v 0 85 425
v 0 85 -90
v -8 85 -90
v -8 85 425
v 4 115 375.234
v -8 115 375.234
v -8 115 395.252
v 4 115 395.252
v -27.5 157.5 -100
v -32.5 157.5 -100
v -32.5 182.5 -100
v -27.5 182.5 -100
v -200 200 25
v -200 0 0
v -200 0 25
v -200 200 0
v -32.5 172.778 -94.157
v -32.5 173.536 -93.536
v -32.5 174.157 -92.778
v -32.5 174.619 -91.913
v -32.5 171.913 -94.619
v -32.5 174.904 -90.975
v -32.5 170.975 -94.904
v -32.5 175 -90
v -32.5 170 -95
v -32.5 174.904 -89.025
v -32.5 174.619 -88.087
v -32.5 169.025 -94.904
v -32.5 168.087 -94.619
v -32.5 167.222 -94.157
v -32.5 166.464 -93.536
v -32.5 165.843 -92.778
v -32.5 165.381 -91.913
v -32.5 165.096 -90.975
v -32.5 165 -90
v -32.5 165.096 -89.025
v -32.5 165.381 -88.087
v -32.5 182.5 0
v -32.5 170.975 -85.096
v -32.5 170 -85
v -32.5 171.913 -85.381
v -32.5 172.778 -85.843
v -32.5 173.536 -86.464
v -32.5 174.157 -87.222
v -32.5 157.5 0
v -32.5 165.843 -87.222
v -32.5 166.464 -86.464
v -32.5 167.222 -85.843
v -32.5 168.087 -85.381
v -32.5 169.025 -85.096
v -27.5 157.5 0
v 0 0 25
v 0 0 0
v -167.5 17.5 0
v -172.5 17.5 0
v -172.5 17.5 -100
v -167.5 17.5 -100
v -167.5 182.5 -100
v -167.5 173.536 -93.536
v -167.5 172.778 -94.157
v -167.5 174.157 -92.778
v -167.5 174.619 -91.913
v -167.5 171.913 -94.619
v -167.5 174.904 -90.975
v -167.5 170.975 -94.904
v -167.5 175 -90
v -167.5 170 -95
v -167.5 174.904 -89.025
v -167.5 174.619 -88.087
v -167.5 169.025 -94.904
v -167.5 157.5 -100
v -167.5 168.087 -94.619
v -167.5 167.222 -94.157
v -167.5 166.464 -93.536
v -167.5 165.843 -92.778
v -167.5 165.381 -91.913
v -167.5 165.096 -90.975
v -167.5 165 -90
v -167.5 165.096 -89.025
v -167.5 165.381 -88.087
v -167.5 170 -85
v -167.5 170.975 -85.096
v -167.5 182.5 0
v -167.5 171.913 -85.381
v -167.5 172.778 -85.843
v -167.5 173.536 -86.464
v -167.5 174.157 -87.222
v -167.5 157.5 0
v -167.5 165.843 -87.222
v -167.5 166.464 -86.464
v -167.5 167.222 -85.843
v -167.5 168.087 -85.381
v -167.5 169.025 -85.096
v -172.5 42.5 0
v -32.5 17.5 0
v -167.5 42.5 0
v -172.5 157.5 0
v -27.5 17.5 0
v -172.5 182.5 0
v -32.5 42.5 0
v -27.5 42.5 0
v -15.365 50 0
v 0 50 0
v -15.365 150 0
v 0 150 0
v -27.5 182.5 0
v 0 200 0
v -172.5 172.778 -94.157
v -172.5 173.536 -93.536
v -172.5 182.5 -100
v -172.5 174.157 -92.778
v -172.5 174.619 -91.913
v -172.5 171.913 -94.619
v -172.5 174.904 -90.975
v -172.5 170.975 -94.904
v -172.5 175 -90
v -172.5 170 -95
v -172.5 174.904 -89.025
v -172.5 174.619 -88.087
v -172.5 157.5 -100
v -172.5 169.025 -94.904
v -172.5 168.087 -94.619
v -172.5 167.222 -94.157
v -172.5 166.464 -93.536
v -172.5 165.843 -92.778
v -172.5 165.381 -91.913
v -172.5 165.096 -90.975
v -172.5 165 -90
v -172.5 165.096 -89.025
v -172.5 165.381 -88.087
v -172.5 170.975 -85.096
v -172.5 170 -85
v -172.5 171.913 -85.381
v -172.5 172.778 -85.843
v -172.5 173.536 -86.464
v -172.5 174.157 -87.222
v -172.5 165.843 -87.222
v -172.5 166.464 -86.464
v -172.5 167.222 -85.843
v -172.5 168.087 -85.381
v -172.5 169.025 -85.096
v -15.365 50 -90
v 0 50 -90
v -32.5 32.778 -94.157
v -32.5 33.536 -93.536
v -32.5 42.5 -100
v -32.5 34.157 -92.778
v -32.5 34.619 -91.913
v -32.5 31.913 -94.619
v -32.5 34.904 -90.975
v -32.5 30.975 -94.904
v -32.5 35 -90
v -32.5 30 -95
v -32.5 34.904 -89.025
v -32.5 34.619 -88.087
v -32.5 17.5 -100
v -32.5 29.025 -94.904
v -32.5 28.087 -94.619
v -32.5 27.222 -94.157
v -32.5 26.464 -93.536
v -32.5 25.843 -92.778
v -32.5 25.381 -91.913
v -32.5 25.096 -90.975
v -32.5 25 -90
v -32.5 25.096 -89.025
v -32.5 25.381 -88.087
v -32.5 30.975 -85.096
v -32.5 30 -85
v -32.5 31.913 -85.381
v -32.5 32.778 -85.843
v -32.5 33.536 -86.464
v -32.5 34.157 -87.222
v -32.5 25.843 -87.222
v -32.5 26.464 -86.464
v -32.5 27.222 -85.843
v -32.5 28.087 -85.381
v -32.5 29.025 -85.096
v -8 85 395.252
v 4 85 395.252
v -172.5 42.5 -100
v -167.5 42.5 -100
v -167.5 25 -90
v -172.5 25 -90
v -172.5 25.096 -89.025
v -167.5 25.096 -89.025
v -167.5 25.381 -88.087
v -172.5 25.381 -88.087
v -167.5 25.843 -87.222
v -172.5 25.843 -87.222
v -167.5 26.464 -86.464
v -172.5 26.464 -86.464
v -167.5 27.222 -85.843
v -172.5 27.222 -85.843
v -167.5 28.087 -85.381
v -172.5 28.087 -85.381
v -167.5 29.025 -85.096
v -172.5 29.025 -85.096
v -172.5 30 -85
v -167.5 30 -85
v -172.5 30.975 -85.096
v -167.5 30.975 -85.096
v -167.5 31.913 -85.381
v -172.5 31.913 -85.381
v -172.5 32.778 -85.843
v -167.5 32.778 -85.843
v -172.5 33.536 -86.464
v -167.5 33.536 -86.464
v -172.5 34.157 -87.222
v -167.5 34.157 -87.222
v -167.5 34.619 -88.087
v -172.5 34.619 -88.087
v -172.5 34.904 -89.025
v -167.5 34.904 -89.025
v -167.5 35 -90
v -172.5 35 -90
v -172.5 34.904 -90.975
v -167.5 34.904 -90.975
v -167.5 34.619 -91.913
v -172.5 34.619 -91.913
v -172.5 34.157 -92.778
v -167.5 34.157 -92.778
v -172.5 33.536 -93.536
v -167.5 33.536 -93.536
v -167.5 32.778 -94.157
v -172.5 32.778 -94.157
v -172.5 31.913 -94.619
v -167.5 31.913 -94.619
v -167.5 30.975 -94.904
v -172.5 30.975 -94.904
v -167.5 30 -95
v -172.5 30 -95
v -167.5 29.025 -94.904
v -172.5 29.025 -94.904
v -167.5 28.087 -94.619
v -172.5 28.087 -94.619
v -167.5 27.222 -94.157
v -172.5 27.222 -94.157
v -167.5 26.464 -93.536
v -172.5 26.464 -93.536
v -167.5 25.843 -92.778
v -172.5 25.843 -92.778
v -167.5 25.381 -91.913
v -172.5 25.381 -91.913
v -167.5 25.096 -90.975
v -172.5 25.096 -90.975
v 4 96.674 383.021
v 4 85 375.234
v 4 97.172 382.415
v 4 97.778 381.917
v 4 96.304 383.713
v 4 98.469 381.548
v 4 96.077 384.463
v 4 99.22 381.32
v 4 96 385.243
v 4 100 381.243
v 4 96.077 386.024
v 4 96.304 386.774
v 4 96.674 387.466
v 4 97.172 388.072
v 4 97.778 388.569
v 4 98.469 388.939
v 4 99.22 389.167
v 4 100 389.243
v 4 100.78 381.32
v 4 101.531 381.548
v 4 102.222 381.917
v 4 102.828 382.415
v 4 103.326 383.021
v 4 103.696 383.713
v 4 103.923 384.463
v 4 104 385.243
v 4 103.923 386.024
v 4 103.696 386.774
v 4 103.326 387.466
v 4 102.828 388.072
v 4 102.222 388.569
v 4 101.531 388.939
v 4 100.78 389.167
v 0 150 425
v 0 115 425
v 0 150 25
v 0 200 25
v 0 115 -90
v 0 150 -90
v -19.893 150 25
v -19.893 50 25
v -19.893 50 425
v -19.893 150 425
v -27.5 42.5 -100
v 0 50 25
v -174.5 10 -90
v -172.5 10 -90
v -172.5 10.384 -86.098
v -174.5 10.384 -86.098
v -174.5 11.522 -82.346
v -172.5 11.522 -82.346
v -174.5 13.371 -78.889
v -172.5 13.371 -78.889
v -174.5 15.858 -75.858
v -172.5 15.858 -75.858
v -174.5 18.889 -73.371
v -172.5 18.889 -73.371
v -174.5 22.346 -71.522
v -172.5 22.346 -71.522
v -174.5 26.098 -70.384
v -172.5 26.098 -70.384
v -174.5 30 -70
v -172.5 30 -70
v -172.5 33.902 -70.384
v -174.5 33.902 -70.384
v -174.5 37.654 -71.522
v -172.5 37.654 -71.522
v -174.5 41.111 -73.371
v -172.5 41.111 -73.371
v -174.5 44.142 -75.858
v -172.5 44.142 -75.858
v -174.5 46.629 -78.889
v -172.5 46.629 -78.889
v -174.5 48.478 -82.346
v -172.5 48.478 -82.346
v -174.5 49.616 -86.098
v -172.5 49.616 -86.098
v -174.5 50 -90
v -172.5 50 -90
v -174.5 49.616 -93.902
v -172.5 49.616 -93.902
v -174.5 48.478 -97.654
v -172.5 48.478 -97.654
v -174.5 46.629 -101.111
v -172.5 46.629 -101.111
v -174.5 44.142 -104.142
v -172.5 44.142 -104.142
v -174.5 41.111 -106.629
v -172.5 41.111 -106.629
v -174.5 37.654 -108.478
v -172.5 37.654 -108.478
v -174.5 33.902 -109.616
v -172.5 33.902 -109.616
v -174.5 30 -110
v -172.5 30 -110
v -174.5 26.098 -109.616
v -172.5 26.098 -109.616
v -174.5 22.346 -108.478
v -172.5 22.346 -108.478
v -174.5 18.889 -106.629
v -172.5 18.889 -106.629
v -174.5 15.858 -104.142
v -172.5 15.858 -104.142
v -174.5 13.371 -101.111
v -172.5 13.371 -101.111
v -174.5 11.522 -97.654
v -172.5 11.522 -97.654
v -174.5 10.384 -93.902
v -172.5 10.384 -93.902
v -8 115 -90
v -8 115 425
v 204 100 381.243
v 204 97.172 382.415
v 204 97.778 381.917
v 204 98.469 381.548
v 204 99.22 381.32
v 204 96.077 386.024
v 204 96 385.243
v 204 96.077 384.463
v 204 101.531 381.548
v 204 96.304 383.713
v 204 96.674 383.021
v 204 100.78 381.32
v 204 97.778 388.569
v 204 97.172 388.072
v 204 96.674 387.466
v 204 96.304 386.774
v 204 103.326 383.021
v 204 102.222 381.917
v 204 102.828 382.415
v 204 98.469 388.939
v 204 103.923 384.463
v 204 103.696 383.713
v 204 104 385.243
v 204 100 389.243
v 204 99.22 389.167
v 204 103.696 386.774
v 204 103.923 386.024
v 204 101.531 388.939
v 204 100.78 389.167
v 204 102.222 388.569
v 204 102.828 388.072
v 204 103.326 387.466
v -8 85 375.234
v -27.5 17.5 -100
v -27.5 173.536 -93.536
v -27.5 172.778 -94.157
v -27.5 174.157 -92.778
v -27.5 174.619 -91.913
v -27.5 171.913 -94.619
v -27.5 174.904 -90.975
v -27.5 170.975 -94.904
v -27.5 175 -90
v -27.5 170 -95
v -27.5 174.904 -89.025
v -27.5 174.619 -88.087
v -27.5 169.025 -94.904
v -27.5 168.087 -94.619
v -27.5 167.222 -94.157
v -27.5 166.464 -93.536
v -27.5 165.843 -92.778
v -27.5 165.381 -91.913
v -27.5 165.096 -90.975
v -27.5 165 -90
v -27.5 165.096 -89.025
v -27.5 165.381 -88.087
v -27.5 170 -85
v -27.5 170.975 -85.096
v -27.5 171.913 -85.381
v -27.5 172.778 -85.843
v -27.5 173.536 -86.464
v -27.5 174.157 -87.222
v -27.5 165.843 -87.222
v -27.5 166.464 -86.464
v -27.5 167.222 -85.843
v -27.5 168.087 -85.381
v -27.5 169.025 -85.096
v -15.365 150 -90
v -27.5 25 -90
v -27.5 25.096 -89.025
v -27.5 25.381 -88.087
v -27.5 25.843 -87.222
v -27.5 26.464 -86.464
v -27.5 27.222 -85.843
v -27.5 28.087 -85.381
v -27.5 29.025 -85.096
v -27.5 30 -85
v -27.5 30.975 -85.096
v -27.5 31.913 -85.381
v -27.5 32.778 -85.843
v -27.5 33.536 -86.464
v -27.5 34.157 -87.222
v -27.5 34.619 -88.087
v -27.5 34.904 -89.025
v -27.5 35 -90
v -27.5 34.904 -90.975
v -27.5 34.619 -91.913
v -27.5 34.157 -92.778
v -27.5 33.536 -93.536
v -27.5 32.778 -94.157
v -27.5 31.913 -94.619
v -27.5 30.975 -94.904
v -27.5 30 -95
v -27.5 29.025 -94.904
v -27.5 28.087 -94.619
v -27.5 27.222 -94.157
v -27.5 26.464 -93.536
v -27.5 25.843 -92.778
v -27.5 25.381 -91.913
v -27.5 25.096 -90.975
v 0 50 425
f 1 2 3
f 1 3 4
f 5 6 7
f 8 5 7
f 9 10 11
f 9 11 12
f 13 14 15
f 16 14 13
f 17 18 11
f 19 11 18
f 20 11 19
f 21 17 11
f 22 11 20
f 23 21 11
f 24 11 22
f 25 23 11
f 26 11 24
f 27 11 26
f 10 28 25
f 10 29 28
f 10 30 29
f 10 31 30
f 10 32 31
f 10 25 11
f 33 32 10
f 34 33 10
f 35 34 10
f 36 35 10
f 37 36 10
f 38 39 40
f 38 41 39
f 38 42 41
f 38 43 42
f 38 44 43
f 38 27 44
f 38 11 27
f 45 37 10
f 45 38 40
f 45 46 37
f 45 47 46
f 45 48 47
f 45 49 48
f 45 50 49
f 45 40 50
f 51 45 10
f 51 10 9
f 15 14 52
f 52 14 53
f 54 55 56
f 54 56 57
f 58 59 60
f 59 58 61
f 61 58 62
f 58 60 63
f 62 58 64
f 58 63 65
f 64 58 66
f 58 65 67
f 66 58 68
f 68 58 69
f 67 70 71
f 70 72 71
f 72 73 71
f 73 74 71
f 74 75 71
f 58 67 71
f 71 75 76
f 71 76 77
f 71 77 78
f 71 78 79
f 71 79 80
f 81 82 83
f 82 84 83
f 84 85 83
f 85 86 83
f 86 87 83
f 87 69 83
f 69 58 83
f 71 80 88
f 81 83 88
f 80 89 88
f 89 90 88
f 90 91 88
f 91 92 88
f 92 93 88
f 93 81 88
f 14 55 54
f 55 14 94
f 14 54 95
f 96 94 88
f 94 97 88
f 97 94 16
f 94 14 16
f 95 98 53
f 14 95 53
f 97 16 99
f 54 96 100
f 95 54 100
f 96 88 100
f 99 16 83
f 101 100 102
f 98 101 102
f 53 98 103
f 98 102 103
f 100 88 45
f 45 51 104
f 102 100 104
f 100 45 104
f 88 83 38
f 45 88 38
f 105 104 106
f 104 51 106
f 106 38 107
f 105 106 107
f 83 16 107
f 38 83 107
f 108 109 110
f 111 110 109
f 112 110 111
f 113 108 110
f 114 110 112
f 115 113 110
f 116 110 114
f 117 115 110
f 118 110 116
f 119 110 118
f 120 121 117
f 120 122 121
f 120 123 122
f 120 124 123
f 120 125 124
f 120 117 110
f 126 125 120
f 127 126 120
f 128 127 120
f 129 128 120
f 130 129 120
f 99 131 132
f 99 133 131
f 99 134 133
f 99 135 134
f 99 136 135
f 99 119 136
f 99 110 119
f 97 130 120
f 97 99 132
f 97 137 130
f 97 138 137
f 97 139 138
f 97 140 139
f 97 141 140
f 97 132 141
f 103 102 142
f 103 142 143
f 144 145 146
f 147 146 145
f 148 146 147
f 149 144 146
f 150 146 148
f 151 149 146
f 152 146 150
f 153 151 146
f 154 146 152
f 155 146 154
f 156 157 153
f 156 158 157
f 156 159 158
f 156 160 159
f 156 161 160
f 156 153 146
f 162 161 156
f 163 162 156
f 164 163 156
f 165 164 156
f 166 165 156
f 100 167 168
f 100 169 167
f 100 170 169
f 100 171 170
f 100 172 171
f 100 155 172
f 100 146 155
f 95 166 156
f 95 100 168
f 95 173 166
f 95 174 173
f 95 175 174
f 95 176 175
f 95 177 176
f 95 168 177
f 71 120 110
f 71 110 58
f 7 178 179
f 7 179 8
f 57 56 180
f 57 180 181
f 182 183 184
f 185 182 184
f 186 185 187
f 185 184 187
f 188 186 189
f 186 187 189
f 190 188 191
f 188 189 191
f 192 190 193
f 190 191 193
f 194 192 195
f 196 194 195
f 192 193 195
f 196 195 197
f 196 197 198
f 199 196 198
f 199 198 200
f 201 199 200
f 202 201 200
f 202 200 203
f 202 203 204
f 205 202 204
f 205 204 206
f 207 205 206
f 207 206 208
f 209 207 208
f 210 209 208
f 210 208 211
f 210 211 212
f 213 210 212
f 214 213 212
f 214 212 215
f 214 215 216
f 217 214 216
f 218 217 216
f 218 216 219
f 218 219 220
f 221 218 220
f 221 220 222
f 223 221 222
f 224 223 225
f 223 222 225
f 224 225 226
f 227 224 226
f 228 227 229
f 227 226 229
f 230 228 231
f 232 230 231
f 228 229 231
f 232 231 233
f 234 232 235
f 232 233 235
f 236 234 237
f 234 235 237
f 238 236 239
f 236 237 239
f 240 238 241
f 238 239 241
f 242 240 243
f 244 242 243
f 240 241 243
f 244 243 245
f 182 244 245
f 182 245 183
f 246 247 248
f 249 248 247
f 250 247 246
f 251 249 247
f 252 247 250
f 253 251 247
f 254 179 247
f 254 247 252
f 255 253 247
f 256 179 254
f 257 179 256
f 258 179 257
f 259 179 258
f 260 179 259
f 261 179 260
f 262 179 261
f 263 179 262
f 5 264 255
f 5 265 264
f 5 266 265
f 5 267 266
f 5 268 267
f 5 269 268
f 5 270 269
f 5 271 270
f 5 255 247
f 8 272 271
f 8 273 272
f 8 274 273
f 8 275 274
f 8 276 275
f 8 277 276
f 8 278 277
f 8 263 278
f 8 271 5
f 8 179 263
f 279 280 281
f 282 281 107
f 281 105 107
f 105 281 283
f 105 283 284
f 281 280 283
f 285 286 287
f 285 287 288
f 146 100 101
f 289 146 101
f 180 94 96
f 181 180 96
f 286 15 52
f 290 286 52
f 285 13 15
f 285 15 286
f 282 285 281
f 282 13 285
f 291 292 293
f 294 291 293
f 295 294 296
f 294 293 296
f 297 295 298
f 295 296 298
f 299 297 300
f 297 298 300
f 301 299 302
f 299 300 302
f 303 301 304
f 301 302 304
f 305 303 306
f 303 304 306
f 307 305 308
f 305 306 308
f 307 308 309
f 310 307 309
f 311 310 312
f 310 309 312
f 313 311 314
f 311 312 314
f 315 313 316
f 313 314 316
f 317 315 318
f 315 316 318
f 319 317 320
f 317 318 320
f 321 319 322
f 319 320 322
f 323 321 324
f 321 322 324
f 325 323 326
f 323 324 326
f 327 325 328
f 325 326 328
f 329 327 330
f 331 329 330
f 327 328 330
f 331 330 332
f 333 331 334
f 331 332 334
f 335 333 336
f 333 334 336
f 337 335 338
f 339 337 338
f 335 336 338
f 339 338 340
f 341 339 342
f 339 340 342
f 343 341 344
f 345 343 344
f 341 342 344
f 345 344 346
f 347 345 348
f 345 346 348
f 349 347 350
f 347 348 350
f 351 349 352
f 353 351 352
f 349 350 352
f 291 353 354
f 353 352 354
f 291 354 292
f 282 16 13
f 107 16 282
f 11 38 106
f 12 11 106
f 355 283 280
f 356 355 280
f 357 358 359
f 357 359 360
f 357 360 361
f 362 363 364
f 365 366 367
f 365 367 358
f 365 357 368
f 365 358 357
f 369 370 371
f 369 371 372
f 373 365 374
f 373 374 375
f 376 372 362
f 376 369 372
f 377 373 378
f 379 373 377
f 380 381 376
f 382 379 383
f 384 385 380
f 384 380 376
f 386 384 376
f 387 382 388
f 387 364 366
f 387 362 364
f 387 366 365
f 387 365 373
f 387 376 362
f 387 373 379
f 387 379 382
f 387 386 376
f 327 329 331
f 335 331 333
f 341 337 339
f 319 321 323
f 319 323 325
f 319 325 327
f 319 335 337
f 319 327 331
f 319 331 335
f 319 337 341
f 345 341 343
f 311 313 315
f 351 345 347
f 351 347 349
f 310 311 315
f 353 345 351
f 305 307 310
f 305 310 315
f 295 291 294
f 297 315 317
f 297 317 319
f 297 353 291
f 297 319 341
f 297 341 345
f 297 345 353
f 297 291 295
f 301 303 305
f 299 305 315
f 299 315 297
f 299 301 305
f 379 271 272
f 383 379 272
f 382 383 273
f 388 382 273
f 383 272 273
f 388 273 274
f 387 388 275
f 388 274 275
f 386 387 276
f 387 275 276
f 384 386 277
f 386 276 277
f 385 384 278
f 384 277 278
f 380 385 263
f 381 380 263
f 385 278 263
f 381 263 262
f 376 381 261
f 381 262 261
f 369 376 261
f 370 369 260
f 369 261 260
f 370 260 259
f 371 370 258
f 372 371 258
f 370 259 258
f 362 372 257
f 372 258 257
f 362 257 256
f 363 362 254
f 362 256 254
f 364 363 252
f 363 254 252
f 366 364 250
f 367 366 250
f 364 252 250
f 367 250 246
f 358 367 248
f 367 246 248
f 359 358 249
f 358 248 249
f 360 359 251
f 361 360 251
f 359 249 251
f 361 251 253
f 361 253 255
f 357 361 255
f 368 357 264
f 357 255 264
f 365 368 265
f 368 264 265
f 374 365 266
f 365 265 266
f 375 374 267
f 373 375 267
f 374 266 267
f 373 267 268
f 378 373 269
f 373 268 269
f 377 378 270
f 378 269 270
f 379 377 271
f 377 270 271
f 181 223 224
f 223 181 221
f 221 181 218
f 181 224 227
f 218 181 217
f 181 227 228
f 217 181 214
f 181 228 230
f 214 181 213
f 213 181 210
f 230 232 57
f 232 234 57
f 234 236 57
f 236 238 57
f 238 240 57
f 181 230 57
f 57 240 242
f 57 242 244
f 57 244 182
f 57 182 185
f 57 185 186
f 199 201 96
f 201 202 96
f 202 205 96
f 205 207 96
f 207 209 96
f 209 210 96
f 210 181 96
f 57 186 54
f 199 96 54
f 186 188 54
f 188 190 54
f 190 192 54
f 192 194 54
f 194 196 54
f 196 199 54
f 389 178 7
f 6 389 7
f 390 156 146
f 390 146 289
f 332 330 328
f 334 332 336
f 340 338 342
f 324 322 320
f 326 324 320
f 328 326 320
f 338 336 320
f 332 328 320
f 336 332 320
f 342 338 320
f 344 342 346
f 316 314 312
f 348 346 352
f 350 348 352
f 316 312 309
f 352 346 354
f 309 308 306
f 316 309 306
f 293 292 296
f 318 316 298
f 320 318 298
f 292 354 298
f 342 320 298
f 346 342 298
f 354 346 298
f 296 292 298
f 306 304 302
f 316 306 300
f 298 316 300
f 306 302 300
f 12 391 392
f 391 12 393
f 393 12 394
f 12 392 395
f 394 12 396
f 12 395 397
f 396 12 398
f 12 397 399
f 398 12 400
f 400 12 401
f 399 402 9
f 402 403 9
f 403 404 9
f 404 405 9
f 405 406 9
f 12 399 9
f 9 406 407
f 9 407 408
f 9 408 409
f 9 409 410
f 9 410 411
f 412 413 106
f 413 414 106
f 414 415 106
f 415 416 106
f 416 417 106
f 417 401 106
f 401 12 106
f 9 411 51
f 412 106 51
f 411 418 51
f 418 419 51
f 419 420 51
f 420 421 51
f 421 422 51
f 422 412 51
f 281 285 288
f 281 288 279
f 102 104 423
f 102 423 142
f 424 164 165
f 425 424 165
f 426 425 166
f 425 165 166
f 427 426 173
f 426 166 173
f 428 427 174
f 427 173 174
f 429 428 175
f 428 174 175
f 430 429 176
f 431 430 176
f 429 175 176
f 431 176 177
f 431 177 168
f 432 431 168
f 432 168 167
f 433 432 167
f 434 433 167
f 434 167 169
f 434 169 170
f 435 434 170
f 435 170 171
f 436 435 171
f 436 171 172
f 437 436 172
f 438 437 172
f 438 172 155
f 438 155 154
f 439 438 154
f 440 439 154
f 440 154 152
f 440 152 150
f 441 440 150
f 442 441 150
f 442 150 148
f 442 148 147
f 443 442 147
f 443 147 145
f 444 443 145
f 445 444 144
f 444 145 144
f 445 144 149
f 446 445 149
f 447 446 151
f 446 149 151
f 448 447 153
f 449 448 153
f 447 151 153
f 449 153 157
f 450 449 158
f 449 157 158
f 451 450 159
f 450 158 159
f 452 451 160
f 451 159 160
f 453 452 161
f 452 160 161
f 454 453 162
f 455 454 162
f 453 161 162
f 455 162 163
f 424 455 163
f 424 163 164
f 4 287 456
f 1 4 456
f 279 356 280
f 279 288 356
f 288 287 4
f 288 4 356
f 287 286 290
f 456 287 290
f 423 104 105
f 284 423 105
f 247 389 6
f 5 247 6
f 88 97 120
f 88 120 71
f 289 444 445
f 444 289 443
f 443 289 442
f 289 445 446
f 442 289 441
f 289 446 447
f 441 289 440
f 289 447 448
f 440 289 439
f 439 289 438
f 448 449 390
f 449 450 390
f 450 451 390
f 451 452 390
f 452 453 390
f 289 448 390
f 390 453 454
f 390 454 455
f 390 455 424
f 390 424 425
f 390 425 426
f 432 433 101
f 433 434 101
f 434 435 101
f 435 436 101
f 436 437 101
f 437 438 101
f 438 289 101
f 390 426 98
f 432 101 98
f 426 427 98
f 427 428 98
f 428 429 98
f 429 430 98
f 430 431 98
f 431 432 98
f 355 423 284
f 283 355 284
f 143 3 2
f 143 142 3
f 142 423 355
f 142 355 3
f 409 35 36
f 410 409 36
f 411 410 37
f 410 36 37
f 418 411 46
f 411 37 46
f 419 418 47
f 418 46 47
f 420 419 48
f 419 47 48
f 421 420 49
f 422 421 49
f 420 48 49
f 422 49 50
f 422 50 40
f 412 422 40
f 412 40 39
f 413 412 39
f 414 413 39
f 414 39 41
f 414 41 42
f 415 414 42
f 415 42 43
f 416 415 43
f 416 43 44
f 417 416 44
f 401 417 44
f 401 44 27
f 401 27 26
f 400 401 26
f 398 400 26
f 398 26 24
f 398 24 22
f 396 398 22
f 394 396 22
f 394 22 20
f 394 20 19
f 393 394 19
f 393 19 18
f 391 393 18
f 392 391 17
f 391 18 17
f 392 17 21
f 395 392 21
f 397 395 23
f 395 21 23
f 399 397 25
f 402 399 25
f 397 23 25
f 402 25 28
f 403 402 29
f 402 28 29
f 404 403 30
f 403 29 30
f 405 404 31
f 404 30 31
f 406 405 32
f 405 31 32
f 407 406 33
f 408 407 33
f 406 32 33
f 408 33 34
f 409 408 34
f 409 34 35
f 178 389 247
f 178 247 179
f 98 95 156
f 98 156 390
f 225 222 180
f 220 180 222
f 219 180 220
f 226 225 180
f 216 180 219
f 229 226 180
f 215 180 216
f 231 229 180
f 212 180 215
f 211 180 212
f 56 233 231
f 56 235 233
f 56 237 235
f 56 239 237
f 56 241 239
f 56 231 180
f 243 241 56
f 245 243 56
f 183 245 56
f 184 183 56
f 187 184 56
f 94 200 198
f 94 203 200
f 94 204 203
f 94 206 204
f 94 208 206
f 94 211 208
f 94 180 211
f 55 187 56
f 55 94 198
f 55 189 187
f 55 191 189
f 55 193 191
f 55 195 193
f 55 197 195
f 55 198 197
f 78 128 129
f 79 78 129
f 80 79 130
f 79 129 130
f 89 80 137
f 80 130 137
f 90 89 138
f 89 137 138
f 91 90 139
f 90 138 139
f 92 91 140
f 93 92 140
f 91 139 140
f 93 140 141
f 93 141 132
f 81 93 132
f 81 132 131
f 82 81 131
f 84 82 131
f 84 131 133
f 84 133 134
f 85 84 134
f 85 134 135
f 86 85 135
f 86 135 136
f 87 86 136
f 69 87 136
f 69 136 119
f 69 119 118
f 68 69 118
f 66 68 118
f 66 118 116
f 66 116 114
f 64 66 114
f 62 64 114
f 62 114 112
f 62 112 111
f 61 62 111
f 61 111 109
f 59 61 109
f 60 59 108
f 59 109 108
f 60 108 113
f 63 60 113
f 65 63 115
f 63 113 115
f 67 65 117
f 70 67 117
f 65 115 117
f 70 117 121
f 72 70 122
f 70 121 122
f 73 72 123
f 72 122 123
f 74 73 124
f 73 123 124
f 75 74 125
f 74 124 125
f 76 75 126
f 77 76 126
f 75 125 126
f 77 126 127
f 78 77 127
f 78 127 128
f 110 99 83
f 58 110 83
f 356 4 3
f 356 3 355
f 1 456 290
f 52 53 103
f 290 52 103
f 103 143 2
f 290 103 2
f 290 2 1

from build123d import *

# Parameters (mm, degrees)
F0_W      = 200
F0_H      = 200
F1_DEPTH  = 25
F2_W      = 5
F2_H      = 25
F3_DEPTH  = 100
F4_R      = 5
F5_DEPTH  = 172.501
F6_R      = 5
F7_DEPTH  = 172.501
F8_W      = 15.3645351529
F8_H      = 100
F9_DEPTH  = 90
F10_W     = 19.893091172
F10_H     = 100
F11_DEPTH = 400
F12_W     = 30
F12_H     = 515
F13_DEPTH = 8
F14_W     = 30
F14_H     = 20.0178325176
F15_DEPTH = 12
F16_R     = 4
F17_DEPTH = 200
F18_R     = 20
F19_DEPTH = 2


with BuildPart() as f1:
    # F0 (on Top) → F1 (new body)
    with BuildSketch(Plane.XY):
        with Locations((-100, 100)):
            Rectangle(F0_W, F0_H)
    extrude(amount=F1_DEPTH)

    # F2 (on face) → F3 (join)
    with BuildSketch(Plane(origin=(0, 0, 0), x_dir=(1, 0, 0), z_dir=(0, 0, -1))):
        with Locations((-170, -30)):
            Rectangle(F2_W, F2_H)
        with Locations((-30, -30)):
            Rectangle(F2_W, F2_H)
        with Locations((-30, -170)):
            Rectangle(F2_W, F2_H)
        with Locations((-170, -170)):
            Rectangle(F2_W, F2_H)
    extrude(amount=F3_DEPTH)

    # F4 (on face) → F5 (cut, through all)
    with BuildSketch(Plane(origin=(-172.5, 0, 0), x_dir=(0, -1, 0), z_dir=(-1, 0, 0))):
        with Locations((-30, -90)):
            Circle(F4_R)
    extrude(amount=-F5_DEPTH, mode=Mode.SUBTRACT)

    # F6 (on face) → F7 (cut, through all)
    with BuildSketch(Plane(origin=(-172.5, 0, 0), x_dir=(0, -1, 0), z_dir=(-1, 0, 0))):
        with Locations((-170, -90)):
            Circle(F6_R)
    extrude(amount=-F7_DEPTH, mode=Mode.SUBTRACT)

    # F8 (on face) → F9 (join)
    with BuildSketch(Plane(origin=(0, 0, 0), x_dir=(1, 0, 0), z_dir=(0, 0, -1))):
        with Locations((-7.6822675765, -100)):
            Rectangle(F8_W, F8_H)
    extrude(amount=F9_DEPTH)

    # F10 (on face) → F11 (join)
    with BuildSketch(Plane.XY.offset(25)):
        with Locations((-9.946545586, 100)):
            Rectangle(F10_W, F10_H)
    extrude(amount=F11_DEPTH)

    # F12 (on face) → F13 (cut)
    with BuildSketch(Plane.YZ):
        with Locations((100, 167.5)):
            Rectangle(F12_W, F12_H)
    extrude(amount=-F13_DEPTH, mode=Mode.SUBTRACT)


with BuildPart() as f15:
    # F14 (on face) → F15 (new body)
    with BuildSketch(Plane.YZ.offset(-8)):
        with Locations((100, 385.243371129)):
            Rectangle(F14_W, F14_H)
    extrude(amount=F15_DEPTH)

    # F16 (on face) → F17 (join)
    with BuildSketch(Plane.YZ.offset(4)):
        with Locations((100, 385.243371129)):
            Circle(F16_R)
    extrude(amount=F17_DEPTH)


with BuildPart() as f19:
    # F18 (on face) → F19 (new body)
    with BuildSketch(Plane(origin=(-172.5, 0, 0), x_dir=(0, -1, 0), z_dir=(-1, 0, 0))):
        with Locations((-30, -90)):
            Circle(F18_R)
    extrude(amount=F19_DEPTH)


solid = Compound([f1.part, f15.part, f19.part])
